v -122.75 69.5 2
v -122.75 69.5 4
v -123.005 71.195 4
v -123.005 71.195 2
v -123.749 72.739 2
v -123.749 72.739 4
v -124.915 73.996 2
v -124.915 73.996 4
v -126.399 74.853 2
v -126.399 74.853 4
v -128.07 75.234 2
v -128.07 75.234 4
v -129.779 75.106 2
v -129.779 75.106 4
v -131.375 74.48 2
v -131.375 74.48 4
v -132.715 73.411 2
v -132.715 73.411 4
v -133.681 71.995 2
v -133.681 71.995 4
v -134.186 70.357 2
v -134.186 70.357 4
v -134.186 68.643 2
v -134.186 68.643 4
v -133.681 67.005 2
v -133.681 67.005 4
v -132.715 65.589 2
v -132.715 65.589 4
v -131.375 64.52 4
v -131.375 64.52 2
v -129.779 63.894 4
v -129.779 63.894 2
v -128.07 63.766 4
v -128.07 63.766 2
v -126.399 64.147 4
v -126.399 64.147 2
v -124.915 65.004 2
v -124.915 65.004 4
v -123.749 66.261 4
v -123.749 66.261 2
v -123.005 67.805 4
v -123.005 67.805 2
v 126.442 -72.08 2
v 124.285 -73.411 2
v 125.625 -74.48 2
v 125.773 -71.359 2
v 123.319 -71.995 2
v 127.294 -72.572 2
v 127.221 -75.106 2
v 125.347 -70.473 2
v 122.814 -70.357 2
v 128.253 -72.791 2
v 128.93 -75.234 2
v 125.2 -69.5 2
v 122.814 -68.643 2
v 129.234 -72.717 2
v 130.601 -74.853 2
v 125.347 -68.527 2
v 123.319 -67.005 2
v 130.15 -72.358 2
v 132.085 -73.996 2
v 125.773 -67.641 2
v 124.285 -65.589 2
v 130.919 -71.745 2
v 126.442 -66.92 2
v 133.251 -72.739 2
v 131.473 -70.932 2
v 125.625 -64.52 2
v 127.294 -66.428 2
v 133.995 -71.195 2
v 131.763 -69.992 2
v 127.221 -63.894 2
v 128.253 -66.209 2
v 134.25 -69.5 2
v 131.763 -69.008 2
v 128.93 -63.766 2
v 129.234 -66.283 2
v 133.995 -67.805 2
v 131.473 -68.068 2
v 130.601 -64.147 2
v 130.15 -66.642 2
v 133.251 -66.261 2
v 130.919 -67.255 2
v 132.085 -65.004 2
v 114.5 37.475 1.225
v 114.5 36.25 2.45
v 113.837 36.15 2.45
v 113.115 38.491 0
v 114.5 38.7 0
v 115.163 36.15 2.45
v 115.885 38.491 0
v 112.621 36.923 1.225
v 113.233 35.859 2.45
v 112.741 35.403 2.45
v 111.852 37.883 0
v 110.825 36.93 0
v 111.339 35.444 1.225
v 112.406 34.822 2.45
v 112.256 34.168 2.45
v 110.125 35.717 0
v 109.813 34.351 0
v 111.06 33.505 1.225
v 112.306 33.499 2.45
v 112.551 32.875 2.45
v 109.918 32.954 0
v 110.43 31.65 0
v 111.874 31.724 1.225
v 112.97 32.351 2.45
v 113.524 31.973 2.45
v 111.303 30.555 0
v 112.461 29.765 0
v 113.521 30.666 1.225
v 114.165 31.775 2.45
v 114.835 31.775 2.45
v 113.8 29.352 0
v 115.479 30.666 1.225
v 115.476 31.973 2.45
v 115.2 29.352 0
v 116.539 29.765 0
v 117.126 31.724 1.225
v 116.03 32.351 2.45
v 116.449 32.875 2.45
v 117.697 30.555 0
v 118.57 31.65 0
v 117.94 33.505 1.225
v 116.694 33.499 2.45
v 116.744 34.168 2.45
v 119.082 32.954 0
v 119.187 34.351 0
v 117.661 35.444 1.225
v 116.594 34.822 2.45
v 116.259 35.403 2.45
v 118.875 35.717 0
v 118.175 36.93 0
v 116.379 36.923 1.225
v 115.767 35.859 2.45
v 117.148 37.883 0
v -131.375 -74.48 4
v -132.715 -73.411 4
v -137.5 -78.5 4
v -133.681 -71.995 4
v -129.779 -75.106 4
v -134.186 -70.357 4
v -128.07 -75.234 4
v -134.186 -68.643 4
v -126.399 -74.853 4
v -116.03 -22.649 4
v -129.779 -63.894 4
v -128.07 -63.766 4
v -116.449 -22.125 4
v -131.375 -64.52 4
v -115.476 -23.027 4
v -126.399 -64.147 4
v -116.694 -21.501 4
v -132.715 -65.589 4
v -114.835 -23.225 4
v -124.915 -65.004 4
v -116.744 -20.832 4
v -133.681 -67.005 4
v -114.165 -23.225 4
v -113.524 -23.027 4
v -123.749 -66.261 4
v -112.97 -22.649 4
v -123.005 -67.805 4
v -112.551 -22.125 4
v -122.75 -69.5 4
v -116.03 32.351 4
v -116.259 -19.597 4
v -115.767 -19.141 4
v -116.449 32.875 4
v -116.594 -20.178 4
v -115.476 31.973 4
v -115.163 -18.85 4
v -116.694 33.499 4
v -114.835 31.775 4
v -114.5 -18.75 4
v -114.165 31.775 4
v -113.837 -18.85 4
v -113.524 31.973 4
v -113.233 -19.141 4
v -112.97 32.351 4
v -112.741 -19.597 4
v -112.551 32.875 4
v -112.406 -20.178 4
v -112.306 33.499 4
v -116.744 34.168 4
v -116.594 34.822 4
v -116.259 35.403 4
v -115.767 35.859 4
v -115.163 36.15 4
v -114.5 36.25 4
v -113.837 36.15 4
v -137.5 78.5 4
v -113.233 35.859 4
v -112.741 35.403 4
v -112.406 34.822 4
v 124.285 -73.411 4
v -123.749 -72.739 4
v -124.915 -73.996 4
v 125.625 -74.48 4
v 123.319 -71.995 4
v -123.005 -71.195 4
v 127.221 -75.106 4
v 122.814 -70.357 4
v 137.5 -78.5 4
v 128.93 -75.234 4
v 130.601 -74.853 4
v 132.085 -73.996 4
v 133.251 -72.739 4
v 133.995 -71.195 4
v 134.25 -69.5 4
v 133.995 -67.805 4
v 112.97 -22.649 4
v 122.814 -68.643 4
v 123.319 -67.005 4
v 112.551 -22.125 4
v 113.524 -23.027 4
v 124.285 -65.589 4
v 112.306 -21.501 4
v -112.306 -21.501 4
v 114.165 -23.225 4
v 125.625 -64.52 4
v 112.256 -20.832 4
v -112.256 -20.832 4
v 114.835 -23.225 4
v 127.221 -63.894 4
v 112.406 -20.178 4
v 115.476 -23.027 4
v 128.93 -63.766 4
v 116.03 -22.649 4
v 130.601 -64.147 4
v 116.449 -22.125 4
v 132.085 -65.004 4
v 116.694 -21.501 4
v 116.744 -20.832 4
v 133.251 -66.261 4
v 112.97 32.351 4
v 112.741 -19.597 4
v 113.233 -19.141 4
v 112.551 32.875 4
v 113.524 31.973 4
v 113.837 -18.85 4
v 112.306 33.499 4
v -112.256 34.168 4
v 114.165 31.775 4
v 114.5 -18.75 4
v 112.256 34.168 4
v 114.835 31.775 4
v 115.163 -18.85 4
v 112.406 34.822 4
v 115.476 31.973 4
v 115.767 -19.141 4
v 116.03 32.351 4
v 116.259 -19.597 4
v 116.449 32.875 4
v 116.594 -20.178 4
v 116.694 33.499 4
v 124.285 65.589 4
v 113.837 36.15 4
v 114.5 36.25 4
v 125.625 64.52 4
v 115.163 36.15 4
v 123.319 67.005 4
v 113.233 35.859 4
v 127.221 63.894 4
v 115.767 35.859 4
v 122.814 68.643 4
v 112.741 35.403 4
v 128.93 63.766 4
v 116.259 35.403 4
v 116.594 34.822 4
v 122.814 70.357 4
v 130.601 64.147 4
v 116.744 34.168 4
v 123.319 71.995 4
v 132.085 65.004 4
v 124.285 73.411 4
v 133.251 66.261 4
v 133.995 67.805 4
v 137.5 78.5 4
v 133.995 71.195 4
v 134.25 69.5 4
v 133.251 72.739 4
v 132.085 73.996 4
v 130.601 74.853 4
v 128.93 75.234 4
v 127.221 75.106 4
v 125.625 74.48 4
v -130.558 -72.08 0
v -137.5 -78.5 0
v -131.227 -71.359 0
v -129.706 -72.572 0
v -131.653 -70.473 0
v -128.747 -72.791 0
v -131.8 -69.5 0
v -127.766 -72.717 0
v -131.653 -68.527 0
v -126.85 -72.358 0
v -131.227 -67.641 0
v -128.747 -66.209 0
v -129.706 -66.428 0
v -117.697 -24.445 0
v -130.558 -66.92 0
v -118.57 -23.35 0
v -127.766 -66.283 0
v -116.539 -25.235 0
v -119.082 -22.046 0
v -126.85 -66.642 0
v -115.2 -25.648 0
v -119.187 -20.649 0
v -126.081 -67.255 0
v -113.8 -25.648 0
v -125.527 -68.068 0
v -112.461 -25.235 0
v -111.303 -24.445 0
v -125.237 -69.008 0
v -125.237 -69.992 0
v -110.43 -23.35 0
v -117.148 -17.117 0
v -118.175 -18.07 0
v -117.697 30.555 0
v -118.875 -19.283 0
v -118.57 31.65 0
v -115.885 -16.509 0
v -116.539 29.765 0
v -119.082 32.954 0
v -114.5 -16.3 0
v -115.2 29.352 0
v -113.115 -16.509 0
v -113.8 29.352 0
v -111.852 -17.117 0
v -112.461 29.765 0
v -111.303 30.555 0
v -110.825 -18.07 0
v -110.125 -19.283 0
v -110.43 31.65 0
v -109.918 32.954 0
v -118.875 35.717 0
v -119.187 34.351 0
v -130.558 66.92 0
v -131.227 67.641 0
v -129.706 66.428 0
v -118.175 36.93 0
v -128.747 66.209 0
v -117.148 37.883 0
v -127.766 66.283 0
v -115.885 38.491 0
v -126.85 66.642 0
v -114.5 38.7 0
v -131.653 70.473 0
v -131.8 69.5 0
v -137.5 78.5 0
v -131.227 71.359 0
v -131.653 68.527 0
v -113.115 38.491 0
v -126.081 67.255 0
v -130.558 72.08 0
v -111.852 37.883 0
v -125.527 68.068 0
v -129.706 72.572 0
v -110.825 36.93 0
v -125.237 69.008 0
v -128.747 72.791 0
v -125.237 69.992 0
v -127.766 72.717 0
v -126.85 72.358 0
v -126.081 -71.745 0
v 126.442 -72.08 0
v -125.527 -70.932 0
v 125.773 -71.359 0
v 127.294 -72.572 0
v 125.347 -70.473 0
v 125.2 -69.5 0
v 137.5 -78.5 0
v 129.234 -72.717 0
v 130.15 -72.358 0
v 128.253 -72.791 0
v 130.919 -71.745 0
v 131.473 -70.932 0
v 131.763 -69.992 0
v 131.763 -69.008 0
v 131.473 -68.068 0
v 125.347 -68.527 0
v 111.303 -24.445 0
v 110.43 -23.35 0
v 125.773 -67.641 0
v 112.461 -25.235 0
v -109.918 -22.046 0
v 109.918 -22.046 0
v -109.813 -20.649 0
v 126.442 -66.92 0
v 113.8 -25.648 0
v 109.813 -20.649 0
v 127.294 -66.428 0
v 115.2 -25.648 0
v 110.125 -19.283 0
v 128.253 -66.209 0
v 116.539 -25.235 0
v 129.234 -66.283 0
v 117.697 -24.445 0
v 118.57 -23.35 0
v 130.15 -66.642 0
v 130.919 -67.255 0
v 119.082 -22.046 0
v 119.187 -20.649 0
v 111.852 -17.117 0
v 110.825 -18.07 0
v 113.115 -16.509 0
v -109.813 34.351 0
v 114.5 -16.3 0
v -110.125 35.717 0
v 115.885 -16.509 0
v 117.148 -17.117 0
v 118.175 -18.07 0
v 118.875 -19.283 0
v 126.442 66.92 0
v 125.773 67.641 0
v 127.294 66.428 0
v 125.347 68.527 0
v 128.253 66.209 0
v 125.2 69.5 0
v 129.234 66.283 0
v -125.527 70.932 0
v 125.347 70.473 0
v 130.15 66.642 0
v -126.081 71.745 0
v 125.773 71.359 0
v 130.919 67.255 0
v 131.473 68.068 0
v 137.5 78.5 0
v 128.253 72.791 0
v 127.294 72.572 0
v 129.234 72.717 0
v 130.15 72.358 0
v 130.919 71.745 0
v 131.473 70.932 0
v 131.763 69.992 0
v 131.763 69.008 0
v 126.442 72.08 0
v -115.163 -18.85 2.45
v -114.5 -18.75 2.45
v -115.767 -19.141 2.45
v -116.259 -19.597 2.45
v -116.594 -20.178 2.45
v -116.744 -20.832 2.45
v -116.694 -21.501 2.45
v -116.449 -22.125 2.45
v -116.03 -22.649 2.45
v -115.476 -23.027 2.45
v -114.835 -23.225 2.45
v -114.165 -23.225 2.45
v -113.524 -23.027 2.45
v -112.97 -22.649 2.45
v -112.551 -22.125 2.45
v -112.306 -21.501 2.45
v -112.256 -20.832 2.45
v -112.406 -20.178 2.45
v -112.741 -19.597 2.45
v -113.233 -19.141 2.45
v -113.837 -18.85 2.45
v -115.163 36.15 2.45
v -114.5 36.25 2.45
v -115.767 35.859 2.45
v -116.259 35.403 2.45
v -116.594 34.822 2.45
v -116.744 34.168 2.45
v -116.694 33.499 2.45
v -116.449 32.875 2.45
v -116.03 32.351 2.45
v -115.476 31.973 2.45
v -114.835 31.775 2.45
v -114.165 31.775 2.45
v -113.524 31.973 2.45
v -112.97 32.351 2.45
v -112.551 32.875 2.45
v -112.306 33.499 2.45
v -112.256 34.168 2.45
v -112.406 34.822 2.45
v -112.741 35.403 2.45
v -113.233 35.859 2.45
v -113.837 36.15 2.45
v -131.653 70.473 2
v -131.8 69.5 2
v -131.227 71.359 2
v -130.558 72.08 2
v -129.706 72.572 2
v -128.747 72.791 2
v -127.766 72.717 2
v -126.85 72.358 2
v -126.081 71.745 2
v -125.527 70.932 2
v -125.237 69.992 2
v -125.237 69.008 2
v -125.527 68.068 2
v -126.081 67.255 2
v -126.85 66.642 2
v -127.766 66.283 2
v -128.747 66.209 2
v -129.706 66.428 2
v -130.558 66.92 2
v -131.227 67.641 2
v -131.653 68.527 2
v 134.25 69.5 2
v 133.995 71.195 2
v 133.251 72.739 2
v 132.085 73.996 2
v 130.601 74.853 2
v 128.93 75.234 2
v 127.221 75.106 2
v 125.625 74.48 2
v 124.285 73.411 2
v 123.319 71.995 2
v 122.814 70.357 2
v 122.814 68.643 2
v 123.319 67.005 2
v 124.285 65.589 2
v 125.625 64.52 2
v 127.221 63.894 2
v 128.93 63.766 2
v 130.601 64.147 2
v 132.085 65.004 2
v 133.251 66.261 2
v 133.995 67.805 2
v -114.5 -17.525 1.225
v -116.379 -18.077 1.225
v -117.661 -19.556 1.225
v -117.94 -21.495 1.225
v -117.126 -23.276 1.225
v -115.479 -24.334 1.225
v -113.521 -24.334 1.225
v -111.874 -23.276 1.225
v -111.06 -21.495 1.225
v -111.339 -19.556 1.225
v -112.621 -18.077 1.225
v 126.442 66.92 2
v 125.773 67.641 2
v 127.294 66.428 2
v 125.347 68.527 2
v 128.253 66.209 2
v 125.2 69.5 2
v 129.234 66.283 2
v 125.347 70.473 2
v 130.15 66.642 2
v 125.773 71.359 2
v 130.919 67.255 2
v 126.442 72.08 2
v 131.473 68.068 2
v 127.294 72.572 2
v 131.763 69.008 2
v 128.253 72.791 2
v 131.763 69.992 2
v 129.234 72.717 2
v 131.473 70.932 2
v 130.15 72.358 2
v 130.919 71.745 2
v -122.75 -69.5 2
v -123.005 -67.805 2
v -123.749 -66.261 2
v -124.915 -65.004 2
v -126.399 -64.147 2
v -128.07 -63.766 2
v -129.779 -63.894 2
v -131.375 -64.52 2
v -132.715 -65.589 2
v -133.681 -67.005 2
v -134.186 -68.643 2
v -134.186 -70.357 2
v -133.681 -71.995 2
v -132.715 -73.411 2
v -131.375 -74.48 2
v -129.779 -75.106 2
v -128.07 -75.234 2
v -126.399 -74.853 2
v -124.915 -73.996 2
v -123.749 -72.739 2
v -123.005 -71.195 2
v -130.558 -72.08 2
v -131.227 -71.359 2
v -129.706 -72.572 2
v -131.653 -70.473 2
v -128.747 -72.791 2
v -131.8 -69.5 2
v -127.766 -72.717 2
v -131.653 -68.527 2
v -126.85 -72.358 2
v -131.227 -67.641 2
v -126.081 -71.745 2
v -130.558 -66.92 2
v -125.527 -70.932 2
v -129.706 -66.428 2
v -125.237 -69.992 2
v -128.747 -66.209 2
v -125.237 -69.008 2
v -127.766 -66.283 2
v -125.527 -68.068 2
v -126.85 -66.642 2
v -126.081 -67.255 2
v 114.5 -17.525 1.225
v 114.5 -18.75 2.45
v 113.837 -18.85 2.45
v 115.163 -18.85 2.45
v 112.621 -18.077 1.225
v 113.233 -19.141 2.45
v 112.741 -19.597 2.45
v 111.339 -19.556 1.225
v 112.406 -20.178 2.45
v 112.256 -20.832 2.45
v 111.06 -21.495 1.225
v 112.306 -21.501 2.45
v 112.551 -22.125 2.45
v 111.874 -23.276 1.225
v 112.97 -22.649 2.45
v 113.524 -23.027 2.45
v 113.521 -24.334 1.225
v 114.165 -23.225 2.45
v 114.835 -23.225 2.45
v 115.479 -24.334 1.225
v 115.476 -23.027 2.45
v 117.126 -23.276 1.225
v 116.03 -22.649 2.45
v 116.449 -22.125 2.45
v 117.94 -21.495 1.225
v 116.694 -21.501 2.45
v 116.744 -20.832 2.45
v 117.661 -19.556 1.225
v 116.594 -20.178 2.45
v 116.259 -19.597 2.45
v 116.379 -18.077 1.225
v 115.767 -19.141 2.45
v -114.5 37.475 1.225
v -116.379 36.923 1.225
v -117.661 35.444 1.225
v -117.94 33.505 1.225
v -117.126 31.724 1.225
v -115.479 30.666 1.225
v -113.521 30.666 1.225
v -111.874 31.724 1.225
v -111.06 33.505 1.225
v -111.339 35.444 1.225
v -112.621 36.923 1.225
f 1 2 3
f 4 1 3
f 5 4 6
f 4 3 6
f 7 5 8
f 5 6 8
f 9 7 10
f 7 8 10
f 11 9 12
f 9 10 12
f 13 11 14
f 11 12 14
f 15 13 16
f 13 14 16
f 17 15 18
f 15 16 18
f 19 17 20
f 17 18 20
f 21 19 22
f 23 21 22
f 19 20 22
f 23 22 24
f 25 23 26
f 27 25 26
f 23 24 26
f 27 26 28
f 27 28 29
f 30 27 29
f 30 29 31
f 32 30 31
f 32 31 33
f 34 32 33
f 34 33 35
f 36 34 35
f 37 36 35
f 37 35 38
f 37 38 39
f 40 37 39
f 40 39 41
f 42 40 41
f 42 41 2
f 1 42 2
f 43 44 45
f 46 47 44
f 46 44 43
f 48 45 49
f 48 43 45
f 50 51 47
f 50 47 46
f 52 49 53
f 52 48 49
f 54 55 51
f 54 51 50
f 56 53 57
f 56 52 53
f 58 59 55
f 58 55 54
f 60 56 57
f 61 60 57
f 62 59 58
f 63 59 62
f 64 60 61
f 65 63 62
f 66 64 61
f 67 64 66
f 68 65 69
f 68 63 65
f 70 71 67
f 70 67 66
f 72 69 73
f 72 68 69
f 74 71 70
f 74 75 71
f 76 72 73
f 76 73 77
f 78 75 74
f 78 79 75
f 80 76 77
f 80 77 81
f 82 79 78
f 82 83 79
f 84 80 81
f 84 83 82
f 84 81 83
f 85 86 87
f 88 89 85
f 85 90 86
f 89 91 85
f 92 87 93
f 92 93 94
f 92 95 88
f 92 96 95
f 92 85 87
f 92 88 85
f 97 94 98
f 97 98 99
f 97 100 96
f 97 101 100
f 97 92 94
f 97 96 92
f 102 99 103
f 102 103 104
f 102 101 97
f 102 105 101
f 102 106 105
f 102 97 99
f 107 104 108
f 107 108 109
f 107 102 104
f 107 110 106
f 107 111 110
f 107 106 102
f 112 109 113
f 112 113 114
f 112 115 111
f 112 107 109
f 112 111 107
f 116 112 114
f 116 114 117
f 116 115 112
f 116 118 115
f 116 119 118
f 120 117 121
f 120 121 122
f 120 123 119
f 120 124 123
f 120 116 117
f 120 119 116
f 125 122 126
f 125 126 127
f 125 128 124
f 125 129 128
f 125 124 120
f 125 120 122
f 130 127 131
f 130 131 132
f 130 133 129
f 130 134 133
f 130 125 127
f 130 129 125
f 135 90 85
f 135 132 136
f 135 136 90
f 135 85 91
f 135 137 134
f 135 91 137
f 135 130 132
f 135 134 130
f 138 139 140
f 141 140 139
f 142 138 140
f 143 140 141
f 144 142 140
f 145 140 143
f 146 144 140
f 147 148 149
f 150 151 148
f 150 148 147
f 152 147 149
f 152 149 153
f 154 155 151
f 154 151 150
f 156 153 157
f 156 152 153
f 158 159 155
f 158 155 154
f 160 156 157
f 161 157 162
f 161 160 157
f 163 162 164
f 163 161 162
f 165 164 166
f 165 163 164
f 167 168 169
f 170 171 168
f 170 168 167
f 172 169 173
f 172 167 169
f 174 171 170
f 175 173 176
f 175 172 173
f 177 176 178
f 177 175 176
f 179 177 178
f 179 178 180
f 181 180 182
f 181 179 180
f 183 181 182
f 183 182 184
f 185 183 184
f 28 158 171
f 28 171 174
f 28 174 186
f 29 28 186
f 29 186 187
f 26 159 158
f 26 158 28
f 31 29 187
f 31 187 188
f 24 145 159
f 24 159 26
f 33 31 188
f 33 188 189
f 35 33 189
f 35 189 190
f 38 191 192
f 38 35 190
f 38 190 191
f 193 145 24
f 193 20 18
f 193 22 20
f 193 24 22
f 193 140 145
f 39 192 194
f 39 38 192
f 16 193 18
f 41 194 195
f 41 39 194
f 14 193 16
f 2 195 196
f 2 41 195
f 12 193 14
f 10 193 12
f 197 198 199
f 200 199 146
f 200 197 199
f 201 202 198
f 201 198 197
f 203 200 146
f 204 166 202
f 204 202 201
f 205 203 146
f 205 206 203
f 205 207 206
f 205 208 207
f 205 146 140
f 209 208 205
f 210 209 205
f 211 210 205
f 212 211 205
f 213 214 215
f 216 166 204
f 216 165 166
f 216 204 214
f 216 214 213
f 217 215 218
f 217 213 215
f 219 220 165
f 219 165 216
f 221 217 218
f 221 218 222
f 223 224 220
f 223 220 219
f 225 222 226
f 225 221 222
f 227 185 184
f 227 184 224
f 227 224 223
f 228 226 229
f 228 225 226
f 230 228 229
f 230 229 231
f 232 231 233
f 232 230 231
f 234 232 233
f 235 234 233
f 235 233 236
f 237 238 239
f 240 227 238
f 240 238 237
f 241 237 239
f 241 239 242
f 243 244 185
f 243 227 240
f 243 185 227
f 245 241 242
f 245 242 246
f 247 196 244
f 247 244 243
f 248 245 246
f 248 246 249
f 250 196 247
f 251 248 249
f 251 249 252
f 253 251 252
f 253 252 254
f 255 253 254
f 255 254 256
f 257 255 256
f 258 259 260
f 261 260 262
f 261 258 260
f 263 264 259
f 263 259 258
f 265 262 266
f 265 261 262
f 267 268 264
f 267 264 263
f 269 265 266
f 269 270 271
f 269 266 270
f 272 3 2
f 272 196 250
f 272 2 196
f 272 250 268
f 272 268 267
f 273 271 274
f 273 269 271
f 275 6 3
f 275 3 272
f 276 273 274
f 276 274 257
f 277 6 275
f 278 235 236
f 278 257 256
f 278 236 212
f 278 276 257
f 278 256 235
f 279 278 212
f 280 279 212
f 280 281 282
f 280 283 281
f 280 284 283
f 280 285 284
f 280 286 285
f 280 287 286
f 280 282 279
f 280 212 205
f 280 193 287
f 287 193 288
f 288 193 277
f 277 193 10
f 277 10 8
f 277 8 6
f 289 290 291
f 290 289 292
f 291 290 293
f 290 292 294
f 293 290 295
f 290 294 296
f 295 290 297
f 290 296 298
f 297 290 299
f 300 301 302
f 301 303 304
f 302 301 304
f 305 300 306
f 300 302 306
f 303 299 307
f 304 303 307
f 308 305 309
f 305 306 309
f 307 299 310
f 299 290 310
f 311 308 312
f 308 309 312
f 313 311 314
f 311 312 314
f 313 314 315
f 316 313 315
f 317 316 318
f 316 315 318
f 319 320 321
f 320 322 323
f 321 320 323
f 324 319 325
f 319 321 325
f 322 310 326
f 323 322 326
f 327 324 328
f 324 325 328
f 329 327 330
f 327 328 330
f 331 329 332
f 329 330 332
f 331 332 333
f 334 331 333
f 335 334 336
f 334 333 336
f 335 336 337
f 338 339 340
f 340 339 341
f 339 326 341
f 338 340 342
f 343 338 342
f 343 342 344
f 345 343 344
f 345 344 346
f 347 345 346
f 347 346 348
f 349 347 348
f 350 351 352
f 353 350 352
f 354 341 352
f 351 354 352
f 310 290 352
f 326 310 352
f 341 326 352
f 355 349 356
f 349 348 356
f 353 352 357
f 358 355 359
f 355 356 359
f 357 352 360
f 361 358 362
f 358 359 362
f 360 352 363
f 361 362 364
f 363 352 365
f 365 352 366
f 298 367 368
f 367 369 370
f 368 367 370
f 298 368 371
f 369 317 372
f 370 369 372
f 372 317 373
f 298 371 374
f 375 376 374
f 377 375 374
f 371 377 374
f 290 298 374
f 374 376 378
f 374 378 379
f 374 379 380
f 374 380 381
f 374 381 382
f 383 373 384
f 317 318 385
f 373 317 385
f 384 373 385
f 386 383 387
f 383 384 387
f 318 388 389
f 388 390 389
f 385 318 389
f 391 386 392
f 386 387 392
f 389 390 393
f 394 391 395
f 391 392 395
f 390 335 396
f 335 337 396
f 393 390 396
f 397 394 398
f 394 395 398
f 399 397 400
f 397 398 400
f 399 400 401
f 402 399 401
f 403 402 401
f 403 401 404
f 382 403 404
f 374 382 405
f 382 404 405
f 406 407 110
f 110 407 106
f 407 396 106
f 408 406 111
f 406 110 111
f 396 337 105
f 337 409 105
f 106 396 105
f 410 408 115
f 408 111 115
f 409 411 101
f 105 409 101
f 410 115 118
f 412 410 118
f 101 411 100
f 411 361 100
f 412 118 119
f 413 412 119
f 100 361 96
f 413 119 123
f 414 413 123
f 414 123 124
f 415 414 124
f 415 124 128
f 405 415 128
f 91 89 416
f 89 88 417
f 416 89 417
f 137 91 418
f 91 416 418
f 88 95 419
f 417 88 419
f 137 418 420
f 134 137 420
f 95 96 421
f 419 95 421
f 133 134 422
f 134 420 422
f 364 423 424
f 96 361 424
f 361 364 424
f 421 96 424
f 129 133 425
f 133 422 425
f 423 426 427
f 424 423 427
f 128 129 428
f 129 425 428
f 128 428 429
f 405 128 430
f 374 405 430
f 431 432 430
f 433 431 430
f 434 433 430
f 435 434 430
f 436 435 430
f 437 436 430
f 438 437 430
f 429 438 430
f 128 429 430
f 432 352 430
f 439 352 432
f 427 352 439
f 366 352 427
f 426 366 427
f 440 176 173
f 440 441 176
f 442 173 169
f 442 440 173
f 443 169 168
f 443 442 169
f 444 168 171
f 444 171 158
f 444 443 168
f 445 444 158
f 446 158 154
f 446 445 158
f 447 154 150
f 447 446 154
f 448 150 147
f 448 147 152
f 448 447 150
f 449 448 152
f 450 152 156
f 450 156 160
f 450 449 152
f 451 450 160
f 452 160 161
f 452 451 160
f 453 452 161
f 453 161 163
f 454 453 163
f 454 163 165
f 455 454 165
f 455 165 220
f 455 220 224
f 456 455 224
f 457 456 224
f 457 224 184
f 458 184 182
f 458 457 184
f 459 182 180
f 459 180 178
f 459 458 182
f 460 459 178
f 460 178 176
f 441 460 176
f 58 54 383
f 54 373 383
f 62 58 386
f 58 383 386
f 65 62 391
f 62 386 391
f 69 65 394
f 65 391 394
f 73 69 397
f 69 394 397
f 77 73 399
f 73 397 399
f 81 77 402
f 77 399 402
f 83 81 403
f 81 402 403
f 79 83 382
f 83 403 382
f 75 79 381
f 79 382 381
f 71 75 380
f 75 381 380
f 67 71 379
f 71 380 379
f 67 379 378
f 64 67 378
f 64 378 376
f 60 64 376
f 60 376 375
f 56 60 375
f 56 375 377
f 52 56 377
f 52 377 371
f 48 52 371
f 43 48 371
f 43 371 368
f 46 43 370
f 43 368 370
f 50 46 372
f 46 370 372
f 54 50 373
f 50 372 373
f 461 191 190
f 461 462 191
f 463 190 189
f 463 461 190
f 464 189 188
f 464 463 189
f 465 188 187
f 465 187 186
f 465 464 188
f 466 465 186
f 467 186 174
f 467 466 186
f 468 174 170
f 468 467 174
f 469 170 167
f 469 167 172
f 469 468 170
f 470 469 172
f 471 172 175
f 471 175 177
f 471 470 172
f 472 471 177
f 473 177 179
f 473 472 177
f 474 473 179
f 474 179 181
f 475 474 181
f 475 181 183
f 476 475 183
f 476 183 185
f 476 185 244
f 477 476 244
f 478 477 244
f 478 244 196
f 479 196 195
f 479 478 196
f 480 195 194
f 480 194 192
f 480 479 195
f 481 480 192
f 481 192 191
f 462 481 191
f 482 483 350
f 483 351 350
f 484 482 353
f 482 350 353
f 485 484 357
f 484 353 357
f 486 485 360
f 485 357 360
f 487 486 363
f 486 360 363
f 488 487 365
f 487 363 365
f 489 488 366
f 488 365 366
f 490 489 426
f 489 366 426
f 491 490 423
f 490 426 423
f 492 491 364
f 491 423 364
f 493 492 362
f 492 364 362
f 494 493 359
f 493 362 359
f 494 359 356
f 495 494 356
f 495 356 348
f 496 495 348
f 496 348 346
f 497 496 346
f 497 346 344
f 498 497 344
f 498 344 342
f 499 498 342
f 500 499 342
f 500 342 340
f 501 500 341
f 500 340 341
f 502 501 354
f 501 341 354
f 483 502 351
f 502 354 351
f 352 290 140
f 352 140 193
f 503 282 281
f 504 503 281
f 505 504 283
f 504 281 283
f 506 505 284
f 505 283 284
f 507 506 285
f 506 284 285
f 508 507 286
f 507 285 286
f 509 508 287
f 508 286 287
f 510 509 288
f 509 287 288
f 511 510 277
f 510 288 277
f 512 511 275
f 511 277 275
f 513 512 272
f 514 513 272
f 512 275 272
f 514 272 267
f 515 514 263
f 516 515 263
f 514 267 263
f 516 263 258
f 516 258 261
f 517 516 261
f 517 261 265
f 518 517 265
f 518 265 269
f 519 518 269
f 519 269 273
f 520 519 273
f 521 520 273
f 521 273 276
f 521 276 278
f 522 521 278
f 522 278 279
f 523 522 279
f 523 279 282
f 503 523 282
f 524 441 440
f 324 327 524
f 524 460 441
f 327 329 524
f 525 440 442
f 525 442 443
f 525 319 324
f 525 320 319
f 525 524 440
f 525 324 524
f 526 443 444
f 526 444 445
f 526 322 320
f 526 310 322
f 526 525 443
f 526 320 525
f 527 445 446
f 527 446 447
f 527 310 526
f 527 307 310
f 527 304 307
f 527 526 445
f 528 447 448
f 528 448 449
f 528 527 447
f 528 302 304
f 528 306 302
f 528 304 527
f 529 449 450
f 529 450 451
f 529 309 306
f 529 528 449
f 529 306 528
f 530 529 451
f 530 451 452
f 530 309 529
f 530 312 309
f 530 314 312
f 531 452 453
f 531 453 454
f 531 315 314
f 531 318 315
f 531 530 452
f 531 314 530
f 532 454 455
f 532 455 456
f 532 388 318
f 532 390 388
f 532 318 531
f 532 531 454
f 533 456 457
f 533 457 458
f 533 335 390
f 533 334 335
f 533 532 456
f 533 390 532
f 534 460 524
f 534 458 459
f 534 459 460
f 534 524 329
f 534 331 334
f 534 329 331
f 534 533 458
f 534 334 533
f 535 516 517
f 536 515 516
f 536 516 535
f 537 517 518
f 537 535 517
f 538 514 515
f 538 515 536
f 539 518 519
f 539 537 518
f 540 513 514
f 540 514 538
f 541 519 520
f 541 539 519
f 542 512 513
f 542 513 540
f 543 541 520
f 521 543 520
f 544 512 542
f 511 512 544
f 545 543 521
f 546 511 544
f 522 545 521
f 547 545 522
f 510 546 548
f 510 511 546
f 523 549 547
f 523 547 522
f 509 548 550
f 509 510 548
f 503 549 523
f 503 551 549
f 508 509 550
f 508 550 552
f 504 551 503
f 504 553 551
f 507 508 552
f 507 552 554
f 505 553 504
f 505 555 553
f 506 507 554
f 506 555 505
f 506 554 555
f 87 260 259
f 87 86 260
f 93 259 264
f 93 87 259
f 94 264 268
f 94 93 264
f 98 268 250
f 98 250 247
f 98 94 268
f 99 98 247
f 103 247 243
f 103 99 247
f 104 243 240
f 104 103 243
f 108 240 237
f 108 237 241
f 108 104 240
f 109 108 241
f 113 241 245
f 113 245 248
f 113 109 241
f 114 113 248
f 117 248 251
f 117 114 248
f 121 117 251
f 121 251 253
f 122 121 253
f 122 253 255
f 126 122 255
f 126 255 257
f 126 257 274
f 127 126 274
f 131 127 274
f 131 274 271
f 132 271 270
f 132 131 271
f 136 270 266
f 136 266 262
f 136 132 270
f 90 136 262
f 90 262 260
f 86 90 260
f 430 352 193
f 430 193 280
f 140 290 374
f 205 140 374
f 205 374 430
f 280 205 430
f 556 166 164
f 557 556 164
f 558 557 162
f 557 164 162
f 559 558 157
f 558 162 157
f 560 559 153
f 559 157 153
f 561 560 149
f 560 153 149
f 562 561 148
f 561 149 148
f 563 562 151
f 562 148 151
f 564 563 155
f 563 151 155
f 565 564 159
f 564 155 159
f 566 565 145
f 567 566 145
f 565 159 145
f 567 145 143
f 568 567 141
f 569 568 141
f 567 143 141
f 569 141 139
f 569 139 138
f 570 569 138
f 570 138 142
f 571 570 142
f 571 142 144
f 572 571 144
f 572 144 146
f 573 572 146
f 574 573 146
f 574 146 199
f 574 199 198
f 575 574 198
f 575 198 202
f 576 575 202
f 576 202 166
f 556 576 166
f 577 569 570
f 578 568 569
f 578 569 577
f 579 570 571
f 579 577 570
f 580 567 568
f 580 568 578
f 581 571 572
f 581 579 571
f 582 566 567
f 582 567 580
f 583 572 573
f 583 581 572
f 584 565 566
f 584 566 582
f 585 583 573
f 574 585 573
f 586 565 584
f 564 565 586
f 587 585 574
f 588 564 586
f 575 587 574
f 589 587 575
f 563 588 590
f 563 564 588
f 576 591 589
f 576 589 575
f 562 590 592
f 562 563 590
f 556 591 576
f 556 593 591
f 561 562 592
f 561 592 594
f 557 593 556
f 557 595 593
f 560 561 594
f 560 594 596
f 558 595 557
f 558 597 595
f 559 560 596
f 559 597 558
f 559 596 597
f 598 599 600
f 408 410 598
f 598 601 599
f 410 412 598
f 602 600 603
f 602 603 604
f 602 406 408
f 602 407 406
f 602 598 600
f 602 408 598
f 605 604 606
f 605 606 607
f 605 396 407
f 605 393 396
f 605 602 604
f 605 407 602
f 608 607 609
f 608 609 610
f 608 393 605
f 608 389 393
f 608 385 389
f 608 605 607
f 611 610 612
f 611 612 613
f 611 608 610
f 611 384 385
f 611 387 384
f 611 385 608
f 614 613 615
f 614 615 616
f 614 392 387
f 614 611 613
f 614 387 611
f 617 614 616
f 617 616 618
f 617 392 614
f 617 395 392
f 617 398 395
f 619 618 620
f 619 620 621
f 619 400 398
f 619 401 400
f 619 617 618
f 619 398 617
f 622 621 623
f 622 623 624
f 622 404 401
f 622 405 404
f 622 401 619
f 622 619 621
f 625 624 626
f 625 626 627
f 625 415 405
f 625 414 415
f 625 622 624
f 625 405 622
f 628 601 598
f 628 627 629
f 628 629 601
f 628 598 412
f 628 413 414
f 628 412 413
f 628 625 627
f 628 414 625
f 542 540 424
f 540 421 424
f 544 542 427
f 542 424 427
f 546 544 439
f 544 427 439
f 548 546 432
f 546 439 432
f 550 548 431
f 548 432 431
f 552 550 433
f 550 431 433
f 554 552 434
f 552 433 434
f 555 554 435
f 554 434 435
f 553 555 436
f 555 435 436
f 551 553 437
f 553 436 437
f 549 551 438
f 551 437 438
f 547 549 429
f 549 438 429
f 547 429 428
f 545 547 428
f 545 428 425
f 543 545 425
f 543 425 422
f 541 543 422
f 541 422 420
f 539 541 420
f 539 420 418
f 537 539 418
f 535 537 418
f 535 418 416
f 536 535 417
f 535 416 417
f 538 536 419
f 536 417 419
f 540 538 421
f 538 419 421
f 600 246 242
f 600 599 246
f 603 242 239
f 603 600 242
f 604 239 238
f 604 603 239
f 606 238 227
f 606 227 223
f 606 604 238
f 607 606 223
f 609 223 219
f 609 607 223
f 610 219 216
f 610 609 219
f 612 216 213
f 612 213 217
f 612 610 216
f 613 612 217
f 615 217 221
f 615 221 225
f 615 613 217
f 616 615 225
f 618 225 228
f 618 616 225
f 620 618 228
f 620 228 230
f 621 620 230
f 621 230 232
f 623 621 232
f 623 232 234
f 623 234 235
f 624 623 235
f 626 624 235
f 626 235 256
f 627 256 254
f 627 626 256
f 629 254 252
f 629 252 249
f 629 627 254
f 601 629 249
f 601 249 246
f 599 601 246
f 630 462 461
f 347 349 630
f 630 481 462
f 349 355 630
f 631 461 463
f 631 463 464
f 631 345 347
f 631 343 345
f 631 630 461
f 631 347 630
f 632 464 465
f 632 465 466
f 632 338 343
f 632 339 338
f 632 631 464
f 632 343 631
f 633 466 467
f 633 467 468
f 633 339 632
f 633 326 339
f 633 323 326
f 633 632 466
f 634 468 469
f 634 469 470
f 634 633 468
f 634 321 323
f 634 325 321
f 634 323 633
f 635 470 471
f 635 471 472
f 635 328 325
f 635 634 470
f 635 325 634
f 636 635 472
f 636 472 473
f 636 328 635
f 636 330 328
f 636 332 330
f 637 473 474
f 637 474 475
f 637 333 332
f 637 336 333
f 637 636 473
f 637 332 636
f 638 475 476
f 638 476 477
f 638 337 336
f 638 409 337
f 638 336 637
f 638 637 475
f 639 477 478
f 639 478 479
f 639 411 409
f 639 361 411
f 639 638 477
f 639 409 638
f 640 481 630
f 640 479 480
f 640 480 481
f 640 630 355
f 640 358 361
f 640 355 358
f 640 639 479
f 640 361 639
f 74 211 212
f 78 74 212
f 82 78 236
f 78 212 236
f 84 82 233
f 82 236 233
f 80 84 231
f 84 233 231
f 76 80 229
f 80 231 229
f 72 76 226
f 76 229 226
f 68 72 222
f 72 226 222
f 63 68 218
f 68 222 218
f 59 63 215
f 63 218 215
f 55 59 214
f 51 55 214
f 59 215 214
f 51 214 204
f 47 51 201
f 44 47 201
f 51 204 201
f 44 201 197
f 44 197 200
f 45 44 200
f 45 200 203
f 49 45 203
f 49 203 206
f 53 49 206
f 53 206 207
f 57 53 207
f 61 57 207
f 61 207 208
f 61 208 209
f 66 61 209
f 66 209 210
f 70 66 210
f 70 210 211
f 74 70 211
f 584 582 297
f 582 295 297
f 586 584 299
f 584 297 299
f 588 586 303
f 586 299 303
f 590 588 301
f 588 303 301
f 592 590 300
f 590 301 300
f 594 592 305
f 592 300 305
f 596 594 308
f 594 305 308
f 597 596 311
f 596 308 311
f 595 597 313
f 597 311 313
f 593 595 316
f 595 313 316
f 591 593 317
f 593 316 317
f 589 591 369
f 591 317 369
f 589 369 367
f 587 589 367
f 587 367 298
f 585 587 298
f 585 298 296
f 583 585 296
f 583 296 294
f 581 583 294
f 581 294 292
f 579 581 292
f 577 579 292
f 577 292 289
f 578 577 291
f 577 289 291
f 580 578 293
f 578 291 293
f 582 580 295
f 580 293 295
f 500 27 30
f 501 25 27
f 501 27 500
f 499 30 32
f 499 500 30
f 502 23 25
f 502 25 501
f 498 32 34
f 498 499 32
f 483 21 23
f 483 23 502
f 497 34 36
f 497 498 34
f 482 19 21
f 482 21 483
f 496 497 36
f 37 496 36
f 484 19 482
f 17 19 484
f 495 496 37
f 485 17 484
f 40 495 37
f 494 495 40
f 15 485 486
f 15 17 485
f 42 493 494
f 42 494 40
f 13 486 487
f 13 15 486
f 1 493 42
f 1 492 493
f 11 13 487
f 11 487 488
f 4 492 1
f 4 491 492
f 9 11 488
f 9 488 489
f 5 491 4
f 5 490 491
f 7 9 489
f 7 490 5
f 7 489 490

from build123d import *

# Parameters (mm, degrees)
ESQUISSE4_W                                      = 275
ESQUISSE4_H                                      = 157
BOSS_EXTRU_2_DEPTH                               = 4
FRAISAGE_POUR_VIS_T_TE_FRAIS_E_M42_AT_COUNT      = 2
FRAISAGE_POUR_VIS_T_TE_FRAIS_E_M42_AT_PITCH      = 235.512207752
FRAISAGE_POUR_VIS_T_TE_FRAIS_E_M42_2_COUNT       = 2
FRAISAGE_POUR_VIS_T_TE_FRAIS_E_M42_2_PITCH       = 229
FRAISAGE_POUR_VIS_T_TE_FRAIS_E_M42_3_COUNT       = 2
FRAISAGE_POUR_VIS_T_TE_FRAIS_E_M42_3_PITCH       = 55
CHAMBRAGE_POUR_VIS_T_TE_RONDE_6_PANS_D           = 6.6
CHAMBRAGE_POUR_VIS_T_TE_RONDE_6_PANS_CBORE_D     = 11.5
CHAMBRAGE_POUR_VIS_T_TE_RONDE_6_PANS_CBORE_DEPTH = 2


with BuildPart() as part:
    # Esquisse4 → Boss.-Extru.2 (new body)
    with BuildSketch(Plane.XY):
        Rectangle(ESQUISSE4_W, ESQUISSE4_H)
    extrude(amount=BOSS_EXTRU_2_DEPTH)

    # Esquisse6 → Fraisage pour vis à tête fraisée M42 (revolve, cut)
    with BuildSketch(Plane(origin=(-114.5, -21, 0), x_dir=(0, 1, 0), z_dir=(1, 0, 0))):
        Polygon((0, 0), (0, 4), (2.25, 4), (2.25, 2.45), (4.7, 0), align=None)
    fraisage_pour_vis_t_te_frais_e_m42 = revolve(axis=Axis((-114.5, -21, -6.35), (0, 0, 1)), mode=Mode.SUBTRACT)

    # Fraisage pour vis à tête fraisée M42 at: Fraisage pour vis à tête fraisée M42 ×2
    with Locations(*[Vector(0.972348747, 0.233533542, 0) * (i * FRAISAGE_POUR_VIS_T_TE_FRAIS_E_M42_AT_PITCH) for i in range(1, FRAISAGE_POUR_VIS_T_TE_FRAIS_E_M42_AT_COUNT)]):
        add(fraisage_pour_vis_t_te_frais_e_m42, mode=Mode.SUBTRACT)

    # Fraisage pour vis _ t_te frais_e M42 2: Fraisage pour vis à tête fraisée M42 ×2
    with Locations(*[(i * FRAISAGE_POUR_VIS_T_TE_FRAIS_E_M42_2_PITCH, 0, 0) for i in range(1, FRAISAGE_POUR_VIS_T_TE_FRAIS_E_M42_2_COUNT)]):
        add(fraisage_pour_vis_t_te_frais_e_m42, mode=Mode.SUBTRACT)

    # Fraisage pour vis _ t_te frais_e M42 3: Fraisage pour vis à tête fraisée M42 ×2
    with Locations(*[(0, i * FRAISAGE_POUR_VIS_T_TE_FRAIS_E_M42_3_PITCH, 0) for i in range(1, FRAISAGE_POUR_VIS_T_TE_FRAIS_E_M42_3_COUNT)]):
        add(fraisage_pour_vis_t_te_frais_e_m42, mode=Mode.SUBTRACT)

    # Chambrage pour Vis à tête ronde à 6 pans creux M61 (through all)
    with Locations(Plane.XY.offset(4)):
        with Locations((128.5, -69.5), (-128.5, -69.5), (-128.5, 69.5), (128.5, 69.5)):
            CounterBoreHole(CHAMBRAGE_POUR_VIS_T_TE_RONDE_6_PANS_D / 2, CHAMBRAGE_POUR_VIS_T_TE_RONDE_6_PANS_CBORE_D / 2, CHAMBRAGE_POUR_VIS_T_TE_RONDE_6_PANS_CBORE_DEPTH)


solid = part.part
